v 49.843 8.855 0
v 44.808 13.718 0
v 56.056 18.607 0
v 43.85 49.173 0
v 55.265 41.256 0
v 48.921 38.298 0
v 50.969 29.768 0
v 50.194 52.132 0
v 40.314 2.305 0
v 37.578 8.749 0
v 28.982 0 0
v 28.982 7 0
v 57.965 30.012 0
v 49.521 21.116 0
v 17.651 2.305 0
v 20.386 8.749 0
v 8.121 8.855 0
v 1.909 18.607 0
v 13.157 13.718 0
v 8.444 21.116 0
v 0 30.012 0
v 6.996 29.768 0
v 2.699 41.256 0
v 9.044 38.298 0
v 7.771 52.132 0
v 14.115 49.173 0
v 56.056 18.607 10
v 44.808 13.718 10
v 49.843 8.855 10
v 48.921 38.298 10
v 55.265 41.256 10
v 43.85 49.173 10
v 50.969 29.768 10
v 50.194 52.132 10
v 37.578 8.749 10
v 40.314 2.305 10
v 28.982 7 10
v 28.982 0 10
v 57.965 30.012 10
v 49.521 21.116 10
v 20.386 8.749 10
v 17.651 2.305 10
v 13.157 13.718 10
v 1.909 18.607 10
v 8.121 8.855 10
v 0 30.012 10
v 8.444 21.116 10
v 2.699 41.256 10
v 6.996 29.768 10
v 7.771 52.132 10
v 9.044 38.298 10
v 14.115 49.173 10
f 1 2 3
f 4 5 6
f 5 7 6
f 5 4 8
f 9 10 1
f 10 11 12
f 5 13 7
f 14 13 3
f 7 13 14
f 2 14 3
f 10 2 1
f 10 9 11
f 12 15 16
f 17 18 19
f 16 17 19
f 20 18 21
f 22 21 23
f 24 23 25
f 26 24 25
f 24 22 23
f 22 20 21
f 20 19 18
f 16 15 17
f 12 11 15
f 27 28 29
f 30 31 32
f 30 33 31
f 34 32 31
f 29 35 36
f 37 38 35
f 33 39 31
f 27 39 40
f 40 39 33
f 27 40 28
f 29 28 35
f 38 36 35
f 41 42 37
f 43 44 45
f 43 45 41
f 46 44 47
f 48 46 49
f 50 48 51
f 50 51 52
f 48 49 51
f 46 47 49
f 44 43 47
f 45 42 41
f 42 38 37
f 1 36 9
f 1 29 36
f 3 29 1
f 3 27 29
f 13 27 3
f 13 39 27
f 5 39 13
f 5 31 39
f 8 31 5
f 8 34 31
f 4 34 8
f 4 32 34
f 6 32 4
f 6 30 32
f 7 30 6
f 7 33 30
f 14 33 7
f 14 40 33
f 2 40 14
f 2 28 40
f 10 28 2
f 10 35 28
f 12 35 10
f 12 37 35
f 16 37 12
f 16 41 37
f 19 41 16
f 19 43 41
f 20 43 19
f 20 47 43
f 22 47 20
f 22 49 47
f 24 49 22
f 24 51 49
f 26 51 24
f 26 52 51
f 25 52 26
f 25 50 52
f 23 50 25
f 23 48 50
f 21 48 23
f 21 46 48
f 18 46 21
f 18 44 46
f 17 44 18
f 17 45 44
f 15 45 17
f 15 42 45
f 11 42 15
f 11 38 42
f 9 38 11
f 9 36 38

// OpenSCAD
$fn = 32;

// ----------------------------------------------------------------------
// Clip blank: omega clip, 10 mm thick
// ----------------------------------------------------------------------

// --- parameters (mm) ---
profile_height = 10;      // extrusion height
profile_points = 26;      // points of the closed outline

profile = [[2.699, 41.256], [0, 30.012], [1.909, 18.607], [8.121, 8.855], [17.651, 2.305], [28.982, 0], [40.314, 2.305], [49.843, 8.855], [56.056, 18.607], [57.965, 30.012], [55.265, 41.256], [50.194, 52.132], [43.85, 49.173], [48.921, 38.298], [50.969, 29.768], [49.521, 21.116], [44.808, 13.718], [37.578, 8.749], [28.982, 7], [20.386, 8.749], [13.157, 13.718], [8.444, 21.116], [6.996, 29.768], [9.044, 38.298], [14.115, 49.173], [7.771, 52.132]];  // single closed polygon, 26 points, counter clockwise

// --- the one profile operation ---
linear_extrude(height = profile_height) polygon(points = profile);
